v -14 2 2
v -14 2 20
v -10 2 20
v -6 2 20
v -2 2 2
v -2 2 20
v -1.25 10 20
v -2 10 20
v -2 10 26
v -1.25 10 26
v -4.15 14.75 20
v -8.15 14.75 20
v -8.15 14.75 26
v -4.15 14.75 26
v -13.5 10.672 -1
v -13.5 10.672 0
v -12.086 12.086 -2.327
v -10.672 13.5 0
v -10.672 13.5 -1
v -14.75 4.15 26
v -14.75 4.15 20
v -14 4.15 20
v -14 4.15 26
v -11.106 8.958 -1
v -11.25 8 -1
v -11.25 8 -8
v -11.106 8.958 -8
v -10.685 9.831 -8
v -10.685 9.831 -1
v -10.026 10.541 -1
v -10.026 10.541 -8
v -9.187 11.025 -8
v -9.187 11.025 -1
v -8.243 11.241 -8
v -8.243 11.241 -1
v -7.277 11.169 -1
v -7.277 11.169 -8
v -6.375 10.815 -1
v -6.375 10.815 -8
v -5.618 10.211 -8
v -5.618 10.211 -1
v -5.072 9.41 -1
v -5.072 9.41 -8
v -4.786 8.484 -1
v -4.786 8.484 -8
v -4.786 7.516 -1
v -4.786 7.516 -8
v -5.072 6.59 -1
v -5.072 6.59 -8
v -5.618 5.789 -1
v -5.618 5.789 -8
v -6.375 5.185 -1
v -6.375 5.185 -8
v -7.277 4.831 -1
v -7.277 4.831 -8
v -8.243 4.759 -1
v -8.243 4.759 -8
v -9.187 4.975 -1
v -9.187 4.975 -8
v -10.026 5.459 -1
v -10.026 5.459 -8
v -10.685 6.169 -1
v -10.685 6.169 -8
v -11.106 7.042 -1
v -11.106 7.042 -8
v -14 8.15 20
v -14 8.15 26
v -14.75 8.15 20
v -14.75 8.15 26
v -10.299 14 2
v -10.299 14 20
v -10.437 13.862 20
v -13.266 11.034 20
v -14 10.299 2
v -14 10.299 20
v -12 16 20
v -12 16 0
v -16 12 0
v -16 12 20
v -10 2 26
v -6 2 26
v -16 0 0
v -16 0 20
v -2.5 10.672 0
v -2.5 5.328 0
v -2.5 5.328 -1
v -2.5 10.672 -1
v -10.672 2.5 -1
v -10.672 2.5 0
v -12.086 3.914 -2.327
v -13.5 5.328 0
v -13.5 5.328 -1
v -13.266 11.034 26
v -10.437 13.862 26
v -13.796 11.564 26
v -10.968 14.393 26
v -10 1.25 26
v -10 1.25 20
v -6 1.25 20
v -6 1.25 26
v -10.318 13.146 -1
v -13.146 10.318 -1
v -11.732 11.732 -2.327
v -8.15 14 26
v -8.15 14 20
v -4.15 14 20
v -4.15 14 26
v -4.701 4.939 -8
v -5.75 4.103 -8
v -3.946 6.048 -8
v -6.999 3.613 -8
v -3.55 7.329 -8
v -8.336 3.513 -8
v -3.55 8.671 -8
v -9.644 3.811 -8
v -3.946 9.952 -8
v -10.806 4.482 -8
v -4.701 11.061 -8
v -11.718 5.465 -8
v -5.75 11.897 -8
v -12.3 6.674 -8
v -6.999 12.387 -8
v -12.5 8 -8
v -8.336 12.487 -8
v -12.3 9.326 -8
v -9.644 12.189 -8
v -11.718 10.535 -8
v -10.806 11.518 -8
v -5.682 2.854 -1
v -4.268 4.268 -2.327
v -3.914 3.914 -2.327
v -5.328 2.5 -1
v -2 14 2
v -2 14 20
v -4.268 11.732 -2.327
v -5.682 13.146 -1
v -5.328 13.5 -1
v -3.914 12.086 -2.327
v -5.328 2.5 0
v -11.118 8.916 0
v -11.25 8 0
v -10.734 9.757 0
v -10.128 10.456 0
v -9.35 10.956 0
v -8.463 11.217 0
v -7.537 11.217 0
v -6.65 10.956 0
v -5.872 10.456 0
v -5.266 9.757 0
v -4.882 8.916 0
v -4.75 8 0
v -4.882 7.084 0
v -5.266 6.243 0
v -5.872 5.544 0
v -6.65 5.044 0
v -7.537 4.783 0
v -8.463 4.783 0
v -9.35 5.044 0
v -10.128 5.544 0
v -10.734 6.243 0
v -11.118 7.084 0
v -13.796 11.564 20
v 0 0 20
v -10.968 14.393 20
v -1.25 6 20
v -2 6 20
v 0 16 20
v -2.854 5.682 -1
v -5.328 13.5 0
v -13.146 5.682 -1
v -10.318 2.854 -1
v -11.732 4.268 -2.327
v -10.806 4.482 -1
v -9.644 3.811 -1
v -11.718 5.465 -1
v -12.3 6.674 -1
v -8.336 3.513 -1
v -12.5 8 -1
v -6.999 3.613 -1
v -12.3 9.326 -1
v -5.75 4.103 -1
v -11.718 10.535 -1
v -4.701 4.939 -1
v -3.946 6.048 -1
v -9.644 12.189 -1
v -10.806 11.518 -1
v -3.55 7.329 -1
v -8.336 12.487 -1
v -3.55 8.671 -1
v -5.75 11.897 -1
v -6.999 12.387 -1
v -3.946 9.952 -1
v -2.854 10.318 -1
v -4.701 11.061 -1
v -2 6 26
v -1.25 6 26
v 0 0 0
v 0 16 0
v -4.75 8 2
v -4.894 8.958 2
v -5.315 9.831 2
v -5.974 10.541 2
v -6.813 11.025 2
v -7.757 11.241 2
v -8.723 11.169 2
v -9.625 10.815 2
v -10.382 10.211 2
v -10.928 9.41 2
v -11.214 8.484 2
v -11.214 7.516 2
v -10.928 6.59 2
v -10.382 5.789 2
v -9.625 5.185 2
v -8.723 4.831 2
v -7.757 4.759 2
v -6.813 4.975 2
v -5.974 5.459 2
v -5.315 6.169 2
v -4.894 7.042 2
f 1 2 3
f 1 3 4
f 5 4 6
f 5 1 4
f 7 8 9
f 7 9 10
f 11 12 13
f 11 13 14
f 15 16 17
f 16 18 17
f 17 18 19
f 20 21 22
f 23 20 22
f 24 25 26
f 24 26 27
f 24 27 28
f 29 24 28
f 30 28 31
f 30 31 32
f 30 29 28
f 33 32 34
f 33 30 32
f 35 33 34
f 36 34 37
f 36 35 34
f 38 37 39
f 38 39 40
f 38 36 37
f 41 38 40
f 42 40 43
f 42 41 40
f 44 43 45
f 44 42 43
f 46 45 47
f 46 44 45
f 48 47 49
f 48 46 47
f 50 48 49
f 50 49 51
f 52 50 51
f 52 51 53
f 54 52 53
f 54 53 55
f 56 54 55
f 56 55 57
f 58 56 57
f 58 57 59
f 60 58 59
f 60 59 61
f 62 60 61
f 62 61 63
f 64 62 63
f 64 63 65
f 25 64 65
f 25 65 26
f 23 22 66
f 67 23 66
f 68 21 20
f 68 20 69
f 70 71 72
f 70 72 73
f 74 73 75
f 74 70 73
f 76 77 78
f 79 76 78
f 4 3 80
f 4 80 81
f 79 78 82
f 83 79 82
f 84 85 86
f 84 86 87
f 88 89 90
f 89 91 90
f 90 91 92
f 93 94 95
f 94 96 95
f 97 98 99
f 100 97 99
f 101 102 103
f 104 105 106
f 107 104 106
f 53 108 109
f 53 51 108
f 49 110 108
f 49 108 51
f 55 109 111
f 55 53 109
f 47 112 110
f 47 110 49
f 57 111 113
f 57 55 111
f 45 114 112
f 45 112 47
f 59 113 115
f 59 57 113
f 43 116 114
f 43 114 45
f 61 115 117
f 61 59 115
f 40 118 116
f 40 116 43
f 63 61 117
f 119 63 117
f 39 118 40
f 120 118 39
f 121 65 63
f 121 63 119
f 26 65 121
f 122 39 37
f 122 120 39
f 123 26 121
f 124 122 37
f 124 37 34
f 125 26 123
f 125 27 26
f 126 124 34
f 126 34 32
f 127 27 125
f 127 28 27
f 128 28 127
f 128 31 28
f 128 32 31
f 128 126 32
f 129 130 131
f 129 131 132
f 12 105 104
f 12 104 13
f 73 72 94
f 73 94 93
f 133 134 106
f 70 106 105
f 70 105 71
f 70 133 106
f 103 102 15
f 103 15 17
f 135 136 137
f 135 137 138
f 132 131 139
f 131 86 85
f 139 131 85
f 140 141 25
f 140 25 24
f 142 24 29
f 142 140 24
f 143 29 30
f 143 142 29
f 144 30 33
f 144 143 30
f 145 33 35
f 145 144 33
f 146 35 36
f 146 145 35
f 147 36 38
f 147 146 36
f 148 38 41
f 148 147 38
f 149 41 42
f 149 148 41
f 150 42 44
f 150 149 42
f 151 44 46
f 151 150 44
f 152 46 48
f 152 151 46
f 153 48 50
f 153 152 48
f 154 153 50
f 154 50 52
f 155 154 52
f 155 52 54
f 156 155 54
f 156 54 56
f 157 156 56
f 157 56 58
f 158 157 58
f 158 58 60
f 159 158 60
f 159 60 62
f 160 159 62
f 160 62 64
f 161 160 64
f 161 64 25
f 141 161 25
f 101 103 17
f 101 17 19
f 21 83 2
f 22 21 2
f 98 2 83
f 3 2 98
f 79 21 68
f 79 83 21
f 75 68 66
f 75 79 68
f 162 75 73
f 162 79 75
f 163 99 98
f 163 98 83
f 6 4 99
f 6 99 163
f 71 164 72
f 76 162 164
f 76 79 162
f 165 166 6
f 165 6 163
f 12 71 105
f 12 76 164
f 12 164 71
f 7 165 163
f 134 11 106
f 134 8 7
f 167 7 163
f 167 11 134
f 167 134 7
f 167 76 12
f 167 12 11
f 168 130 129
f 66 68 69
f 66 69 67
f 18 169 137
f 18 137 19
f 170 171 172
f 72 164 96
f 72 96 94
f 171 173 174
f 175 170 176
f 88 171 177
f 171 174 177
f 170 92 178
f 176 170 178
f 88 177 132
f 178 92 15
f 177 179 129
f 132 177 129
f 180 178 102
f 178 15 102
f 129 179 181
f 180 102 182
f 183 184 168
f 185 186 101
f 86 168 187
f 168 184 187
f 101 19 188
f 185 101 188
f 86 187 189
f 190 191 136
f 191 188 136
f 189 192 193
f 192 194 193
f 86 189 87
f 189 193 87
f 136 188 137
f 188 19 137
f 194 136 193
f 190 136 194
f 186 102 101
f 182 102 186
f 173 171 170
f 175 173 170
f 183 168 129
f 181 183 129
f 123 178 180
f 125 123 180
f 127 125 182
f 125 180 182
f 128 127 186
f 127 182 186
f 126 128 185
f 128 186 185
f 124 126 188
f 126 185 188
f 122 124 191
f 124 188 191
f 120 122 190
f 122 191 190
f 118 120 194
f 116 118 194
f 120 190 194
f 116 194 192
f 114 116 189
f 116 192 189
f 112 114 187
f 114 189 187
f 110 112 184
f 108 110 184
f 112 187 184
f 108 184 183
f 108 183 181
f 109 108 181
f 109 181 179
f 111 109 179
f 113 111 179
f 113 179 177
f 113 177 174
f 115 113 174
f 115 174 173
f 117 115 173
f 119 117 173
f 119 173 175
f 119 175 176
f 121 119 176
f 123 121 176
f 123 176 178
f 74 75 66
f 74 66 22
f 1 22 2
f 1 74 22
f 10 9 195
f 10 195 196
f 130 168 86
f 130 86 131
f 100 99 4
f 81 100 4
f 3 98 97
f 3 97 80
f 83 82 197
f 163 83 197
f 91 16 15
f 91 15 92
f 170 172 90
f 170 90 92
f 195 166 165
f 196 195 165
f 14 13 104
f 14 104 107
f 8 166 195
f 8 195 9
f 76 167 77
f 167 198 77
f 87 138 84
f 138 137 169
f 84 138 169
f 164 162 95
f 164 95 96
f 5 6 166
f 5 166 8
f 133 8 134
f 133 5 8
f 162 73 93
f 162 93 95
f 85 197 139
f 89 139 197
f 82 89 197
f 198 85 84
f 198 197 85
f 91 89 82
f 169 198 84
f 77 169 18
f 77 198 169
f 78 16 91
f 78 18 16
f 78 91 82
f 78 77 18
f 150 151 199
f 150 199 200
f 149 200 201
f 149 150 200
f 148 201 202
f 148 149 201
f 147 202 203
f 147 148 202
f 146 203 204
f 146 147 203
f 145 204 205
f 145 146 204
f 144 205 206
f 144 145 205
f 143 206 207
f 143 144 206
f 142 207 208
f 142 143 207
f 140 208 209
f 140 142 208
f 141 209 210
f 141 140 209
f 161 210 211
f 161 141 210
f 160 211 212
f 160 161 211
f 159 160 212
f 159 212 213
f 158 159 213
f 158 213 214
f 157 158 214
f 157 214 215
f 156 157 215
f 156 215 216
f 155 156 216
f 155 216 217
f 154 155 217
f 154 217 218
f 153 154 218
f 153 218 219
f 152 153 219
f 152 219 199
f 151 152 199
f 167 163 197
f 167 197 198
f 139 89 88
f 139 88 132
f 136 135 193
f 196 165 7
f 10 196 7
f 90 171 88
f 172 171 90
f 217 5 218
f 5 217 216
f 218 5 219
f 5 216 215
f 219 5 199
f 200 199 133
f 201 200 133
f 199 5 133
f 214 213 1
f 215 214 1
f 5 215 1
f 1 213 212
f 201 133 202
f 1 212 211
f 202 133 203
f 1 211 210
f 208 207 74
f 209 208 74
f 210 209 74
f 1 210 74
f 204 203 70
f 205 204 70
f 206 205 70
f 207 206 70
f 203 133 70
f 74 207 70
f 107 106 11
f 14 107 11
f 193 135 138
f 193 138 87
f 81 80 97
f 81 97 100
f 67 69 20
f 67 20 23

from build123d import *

# Parameters (mm, degrees)
ESQUISSE1_R         = 3.25
BOSS_EXTRU_1_DEPTH  = 2
BOSS_EXTRU_2_DEPTH  = 18
ESQUISSE3_R         = 4.5
ESQUISSE3_R_2       = 3.25
BOSS_EXTRU_3_DEPTH  = 8
ESQUISSE4_R         = 3.25
BOSS_EXTRU_4_DEPTH  = 1
BOSS_EXTRU_6_DEPTH  = 0.5
BOSS_EXTRU_7_DEPTH  = 0.5
BOSS_EXTRU_8_DEPTH  = 0.5
BOSS_EXTRU_9_DEPTH  = 0.5
ESQUISSE15_W        = 0.75
ESQUISSE15_H        = 4
ESQUISSE15_W_2      = 4
ESQUISSE15_H_2      = 0.75
BOSS_EXTRU_10_DEPTH = 6


with BuildPart() as part:
    # Esquisse1 → Boss.-Extru.1 (new body)
    with BuildSketch(Plane.XY):
        Polygon((0, 0), (-16, 0), (-16, 12), (-12, 16), (0, 16), align=None)
        with Locations((-8, 8)):
            Circle(ESQUISSE1_R, mode=Mode.SUBTRACT)
    extrude(amount=BOSS_EXTRU_1_DEPTH)

    # Esquisse2 → Boss.-Extru.2 (add)
    with BuildSketch(Plane.XY.offset(2)):
        Polygon((-16, 0), (0, 0), (0, 16), (-12, 16), (-16, 12), align=None)
        Polygon((-2, 2), (-2, 14), (-10.299397605, 14), (-14, 10.299397605), (-14, 2), align=None, mode=Mode.SUBTRACT)
    extrude(amount=BOSS_EXTRU_2_DEPTH)

    # Esquisse3 → Boss.-Extru.3 (add)
    with BuildSketch(Plane(origin=(0, 0, 0), x_dir=(-1, 0, 0), z_dir=(0, 0, -1))):
        with Locations((8, 8)):
            Circle(ESQUISSE3_R)
        with Locations((8, 8)):
            Circle(ESQUISSE3_R_2, mode=Mode.SUBTRACT)
    extrude(amount=BOSS_EXTRU_3_DEPTH)

    # Esquisse4 → Boss.-Extru.4 (add)
    with BuildSketch(Plane(origin=(0, 0, 0), x_dir=(-1, 0, 0), z_dir=(0, 0, -1))):
        Polygon((2.5, 5.328427125), (2.5, 10.671572875), (2.853553391, 10.318019485), (5.681980515, 13.146446609), (5.328427125, 13.5), (10.671572875, 13.5), (10.318019485, 13.146446609), (13.146446609, 10.318019485), (13.5, 10.671572875), (13.5, 5.328427125), (13.146446609, 5.681980515), (10.318019485, 2.853553391), (10.671572875, 2.5), (5.328427125, 2.5), (5.681980515, 2.853553391), (2.853553391, 5.681980515), align=None)
        with Locations((8, 8)):
            Circle(ESQUISSE4_R, mode=Mode.SUBTRACT)
    extrude(amount=BOSS_EXTRU_4_DEPTH)

    # Esquisse11 → Boss.-Extru.6 (add)
    with BuildSketch(Plane(origin=(-3.732233047, -3.732233047, 0), x_dir=(0, 0, 1), z_dir=(-0.707106781, -0.707106781, 0))):
        Polygon((0, 9.313708499), (-1, 9.313708499), (-2.326649916, 11.313708499), (-1, 13.313708499), (0, 13.313708499), align=None)
    extrude(amount=BOSS_EXTRU_6_DEPTH)

    # Esquisse12 → Boss.-Extru.7 (add)
    with BuildSketch(Plane(origin=(-4.267766953, 4.267766953, 0), x_dir=(0, 0, -1), z_dir=(0.707106781, -0.707106781, 0))):
        Polygon((0, 2), (1, 2), (2.326649916, 0), (1, -2), (0, -2), align=None)
    extrude(amount=BOSS_EXTRU_7_DEPTH)

    # Esquisse13 → Boss.-Extru.8 (add)
    with BuildSketch(Plane(origin=(3.732233047, 3.732233047, 0), x_dir=(0, 0, -1), z_dir=(0.707106781, 0.707106781, 0))):
        Polygon((0, 13.313708499), (1, 13.313708499), (2.326649916, 11.313708499), (1, 9.313708499), (0, 9.313708499), align=None)
    extrude(amount=BOSS_EXTRU_8_DEPTH)

    # Esquisse14 → Boss.-Extru.9 (add)
    with BuildSketch(Plane(origin=(-11.732233047, 11.732233047, 0), x_dir=(0, 0, 1), z_dir=(-0.707106781, 0.707106781, 0))):
        Polygon((0, -2), (-1, -2), (-2.326649916, 0), (-1, 2), (0, 2), align=None)
    extrude(amount=BOSS_EXTRU_9_DEPTH)

    # Esquisse15 → Boss.-Extru.10 (add)
    with BuildSketch(Plane.XY.offset(20)):
        with Locations((-14.375, 6.15)):
            Rectangle(ESQUISSE15_W, ESQUISSE15_H)
        with Locations((-8, 1.625)):
            Rectangle(ESQUISSE15_W_2, ESQUISSE15_H_2)
        with Locations((-1.625, 8)):
            Rectangle(ESQUISSE15_W, ESQUISSE15_H)
        with Locations((-6.15, 14.375)):
            Rectangle(ESQUISSE15_W_2, ESQUISSE15_H_2)
        Polygon((-10.437222619, 13.862174986), (-13.265649743, 11.033747861), (-13.795979829, 11.564077947), (-10.967552704, 14.392505072), align=None)
    extrude(amount=BOSS_EXTRU_10_DEPTH)


solid = part.part
